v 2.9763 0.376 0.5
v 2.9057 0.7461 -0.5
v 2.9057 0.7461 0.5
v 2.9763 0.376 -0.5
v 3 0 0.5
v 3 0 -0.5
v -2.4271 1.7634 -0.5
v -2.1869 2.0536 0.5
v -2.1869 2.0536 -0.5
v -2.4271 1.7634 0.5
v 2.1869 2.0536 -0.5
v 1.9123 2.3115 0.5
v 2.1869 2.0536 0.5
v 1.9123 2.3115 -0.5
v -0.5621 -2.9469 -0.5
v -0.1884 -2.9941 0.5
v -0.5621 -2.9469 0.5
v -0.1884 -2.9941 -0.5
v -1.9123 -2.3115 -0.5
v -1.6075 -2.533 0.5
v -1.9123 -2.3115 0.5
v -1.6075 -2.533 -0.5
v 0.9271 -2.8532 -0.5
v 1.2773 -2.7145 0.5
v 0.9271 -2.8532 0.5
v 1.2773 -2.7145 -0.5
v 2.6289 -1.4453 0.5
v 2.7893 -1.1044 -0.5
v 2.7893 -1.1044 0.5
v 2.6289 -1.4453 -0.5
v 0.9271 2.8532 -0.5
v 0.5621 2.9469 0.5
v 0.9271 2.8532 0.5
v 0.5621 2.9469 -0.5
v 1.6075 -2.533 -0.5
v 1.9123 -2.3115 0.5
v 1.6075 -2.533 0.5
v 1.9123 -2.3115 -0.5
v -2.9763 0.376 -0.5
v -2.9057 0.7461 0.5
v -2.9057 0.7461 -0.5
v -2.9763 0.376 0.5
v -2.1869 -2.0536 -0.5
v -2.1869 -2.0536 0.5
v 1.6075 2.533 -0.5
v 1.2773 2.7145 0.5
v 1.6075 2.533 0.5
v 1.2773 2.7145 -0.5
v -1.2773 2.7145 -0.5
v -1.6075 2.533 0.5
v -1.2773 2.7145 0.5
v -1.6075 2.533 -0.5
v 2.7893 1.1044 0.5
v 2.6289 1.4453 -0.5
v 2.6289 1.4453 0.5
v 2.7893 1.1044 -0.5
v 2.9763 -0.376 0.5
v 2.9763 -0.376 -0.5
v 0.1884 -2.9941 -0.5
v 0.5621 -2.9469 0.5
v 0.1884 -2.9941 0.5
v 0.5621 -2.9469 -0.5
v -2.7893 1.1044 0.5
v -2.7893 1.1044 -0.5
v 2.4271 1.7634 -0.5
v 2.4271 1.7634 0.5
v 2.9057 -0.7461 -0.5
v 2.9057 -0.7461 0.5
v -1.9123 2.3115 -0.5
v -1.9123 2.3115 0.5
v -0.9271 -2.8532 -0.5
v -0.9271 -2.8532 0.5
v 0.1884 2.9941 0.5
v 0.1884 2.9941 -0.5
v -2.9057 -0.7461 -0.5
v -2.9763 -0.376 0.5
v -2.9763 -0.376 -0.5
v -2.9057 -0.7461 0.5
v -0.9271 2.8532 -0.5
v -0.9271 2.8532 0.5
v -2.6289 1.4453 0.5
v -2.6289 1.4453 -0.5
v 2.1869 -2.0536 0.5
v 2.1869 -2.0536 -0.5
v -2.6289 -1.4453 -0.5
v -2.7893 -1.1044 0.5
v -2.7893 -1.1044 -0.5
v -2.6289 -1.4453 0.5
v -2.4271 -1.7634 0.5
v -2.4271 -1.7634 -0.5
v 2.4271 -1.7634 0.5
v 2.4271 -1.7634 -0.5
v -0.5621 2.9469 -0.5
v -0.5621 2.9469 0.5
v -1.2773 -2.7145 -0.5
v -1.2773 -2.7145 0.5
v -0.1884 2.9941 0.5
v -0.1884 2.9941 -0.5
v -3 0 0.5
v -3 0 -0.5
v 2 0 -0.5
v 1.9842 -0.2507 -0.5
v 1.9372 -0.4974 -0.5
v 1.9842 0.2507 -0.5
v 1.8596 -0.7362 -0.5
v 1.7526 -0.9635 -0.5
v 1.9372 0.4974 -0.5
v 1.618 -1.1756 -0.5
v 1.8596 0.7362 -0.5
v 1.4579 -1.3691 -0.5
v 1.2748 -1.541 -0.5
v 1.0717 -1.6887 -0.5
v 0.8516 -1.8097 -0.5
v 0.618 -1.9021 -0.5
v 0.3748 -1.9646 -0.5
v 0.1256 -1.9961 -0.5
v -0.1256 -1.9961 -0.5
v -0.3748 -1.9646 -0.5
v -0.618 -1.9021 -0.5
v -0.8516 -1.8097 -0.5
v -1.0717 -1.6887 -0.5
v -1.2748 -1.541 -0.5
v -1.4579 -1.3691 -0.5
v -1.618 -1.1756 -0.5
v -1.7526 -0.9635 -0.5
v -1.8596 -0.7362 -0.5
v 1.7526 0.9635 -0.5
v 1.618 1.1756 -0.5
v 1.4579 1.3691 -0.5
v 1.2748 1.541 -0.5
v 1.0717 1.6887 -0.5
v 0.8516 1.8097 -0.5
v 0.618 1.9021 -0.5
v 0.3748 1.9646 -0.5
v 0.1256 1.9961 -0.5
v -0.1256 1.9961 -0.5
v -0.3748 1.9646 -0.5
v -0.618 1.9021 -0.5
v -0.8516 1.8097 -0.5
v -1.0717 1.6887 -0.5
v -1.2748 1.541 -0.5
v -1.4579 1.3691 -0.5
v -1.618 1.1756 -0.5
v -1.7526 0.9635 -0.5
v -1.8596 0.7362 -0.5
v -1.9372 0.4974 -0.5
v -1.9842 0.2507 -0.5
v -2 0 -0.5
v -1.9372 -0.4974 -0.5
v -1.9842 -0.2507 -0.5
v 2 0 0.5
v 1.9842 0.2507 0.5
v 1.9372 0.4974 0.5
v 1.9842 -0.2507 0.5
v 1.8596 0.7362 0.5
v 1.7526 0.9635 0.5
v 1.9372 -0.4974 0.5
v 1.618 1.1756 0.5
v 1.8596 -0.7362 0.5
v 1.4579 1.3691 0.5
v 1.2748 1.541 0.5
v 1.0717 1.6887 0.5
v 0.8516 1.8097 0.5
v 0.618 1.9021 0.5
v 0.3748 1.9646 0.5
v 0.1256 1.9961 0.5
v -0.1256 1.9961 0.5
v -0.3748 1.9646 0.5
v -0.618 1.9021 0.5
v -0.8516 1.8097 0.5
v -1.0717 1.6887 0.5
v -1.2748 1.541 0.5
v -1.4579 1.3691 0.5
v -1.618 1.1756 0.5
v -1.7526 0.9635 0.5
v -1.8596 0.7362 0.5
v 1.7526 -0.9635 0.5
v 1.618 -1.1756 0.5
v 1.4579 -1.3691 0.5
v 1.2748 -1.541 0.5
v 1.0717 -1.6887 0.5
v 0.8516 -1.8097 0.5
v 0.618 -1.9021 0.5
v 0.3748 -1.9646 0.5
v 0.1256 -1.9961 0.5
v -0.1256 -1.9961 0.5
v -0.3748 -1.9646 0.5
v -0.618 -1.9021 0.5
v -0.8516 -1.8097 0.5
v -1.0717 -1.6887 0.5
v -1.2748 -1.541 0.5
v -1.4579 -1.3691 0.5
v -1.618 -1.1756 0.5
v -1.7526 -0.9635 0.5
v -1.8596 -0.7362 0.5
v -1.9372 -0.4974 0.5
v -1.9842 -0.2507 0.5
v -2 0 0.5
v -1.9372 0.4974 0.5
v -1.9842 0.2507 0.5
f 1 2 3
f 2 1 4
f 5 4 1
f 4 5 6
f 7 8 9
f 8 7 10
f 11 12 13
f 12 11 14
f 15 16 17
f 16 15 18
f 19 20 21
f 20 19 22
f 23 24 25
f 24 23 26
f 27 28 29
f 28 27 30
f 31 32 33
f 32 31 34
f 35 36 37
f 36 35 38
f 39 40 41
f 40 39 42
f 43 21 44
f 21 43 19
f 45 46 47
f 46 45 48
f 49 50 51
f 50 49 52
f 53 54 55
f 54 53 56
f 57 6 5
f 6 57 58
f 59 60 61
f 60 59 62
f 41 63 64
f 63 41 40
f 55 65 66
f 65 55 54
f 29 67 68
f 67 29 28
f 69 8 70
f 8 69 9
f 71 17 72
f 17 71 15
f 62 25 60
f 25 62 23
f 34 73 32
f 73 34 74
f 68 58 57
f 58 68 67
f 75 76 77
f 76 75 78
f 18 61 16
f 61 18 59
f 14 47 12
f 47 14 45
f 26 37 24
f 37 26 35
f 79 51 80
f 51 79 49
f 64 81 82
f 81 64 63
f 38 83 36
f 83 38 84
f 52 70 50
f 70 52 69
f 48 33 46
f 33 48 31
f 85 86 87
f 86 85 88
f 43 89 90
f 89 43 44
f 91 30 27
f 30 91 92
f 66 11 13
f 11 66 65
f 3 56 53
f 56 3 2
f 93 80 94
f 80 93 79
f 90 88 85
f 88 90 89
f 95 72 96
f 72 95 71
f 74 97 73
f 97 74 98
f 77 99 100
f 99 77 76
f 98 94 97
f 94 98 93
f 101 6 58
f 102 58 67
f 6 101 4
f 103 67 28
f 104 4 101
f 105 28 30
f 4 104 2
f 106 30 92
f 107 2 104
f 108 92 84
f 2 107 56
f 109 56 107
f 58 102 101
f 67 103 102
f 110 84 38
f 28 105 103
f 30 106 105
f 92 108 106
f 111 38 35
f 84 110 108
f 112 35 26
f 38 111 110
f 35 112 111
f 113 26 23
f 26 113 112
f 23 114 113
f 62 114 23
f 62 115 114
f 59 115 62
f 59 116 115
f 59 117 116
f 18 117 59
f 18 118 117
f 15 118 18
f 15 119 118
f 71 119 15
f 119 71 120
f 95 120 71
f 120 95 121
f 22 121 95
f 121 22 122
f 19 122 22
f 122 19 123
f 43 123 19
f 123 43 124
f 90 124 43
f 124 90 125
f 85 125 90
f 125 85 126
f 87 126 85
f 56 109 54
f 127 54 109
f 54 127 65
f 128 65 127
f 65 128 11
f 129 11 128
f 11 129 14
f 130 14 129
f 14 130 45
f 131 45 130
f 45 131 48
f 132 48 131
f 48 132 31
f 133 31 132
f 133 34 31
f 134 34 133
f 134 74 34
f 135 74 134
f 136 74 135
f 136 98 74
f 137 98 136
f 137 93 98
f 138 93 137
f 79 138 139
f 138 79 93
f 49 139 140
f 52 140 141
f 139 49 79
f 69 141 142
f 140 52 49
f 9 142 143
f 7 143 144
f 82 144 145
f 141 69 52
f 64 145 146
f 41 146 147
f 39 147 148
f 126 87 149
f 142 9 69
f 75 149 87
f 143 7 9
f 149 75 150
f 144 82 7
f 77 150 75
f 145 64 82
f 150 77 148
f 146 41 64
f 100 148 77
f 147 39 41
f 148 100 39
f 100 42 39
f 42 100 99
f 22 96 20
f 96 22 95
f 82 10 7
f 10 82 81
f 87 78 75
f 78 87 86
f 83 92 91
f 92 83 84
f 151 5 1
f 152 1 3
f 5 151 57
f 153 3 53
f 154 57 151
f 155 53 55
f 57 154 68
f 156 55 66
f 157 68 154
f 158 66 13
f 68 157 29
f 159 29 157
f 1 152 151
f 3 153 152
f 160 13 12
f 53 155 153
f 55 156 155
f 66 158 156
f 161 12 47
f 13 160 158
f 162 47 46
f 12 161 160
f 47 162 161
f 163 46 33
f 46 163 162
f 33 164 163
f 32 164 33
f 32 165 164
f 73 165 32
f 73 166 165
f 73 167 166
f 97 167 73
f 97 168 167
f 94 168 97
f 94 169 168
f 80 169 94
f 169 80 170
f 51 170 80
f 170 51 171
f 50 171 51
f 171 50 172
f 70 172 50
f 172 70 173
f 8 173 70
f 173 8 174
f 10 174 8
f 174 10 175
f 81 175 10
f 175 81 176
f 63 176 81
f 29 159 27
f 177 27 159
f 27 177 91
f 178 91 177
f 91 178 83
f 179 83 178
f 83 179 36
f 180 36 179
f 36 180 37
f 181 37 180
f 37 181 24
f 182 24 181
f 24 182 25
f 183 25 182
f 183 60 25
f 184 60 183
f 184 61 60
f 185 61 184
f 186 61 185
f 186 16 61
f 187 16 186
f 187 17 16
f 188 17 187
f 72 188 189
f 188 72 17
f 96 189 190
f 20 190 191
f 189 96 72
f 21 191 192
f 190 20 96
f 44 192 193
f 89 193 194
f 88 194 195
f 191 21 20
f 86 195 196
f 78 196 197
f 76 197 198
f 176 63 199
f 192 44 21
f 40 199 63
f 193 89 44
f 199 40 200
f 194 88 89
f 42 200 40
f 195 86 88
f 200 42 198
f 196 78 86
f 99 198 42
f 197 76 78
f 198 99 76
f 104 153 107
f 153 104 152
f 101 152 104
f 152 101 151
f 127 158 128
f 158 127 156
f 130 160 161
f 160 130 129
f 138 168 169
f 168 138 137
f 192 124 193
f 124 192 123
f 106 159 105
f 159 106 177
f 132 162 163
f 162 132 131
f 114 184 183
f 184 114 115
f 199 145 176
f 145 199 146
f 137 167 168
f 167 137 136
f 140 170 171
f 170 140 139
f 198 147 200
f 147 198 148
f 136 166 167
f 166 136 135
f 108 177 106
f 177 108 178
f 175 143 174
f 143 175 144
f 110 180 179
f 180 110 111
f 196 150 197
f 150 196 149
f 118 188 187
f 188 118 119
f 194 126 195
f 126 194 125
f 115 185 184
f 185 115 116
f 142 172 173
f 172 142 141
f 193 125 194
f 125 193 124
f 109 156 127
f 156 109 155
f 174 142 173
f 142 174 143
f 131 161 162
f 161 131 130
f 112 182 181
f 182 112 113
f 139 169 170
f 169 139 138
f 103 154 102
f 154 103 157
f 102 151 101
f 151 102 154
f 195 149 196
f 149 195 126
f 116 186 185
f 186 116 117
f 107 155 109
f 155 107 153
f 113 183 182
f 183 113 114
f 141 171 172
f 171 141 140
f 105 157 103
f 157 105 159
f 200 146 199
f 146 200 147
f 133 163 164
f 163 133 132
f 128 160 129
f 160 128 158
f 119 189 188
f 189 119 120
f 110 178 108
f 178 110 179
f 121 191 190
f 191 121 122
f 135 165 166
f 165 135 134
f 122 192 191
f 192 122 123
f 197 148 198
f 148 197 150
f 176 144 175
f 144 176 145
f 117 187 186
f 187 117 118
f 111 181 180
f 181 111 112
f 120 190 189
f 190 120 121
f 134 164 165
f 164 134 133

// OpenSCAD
$fn = 50;


difference() {
	union() {
		translate(v = [0, 0, -0.5000000000]) {
			cylinder(h = 1, r = 3.0000000000);
		}
	}
	union() {
		translate(v = [0, 0, -100.0000000000]) {
			cylinder(h = 200, r = 2.0000000000);
		}
	}
}
